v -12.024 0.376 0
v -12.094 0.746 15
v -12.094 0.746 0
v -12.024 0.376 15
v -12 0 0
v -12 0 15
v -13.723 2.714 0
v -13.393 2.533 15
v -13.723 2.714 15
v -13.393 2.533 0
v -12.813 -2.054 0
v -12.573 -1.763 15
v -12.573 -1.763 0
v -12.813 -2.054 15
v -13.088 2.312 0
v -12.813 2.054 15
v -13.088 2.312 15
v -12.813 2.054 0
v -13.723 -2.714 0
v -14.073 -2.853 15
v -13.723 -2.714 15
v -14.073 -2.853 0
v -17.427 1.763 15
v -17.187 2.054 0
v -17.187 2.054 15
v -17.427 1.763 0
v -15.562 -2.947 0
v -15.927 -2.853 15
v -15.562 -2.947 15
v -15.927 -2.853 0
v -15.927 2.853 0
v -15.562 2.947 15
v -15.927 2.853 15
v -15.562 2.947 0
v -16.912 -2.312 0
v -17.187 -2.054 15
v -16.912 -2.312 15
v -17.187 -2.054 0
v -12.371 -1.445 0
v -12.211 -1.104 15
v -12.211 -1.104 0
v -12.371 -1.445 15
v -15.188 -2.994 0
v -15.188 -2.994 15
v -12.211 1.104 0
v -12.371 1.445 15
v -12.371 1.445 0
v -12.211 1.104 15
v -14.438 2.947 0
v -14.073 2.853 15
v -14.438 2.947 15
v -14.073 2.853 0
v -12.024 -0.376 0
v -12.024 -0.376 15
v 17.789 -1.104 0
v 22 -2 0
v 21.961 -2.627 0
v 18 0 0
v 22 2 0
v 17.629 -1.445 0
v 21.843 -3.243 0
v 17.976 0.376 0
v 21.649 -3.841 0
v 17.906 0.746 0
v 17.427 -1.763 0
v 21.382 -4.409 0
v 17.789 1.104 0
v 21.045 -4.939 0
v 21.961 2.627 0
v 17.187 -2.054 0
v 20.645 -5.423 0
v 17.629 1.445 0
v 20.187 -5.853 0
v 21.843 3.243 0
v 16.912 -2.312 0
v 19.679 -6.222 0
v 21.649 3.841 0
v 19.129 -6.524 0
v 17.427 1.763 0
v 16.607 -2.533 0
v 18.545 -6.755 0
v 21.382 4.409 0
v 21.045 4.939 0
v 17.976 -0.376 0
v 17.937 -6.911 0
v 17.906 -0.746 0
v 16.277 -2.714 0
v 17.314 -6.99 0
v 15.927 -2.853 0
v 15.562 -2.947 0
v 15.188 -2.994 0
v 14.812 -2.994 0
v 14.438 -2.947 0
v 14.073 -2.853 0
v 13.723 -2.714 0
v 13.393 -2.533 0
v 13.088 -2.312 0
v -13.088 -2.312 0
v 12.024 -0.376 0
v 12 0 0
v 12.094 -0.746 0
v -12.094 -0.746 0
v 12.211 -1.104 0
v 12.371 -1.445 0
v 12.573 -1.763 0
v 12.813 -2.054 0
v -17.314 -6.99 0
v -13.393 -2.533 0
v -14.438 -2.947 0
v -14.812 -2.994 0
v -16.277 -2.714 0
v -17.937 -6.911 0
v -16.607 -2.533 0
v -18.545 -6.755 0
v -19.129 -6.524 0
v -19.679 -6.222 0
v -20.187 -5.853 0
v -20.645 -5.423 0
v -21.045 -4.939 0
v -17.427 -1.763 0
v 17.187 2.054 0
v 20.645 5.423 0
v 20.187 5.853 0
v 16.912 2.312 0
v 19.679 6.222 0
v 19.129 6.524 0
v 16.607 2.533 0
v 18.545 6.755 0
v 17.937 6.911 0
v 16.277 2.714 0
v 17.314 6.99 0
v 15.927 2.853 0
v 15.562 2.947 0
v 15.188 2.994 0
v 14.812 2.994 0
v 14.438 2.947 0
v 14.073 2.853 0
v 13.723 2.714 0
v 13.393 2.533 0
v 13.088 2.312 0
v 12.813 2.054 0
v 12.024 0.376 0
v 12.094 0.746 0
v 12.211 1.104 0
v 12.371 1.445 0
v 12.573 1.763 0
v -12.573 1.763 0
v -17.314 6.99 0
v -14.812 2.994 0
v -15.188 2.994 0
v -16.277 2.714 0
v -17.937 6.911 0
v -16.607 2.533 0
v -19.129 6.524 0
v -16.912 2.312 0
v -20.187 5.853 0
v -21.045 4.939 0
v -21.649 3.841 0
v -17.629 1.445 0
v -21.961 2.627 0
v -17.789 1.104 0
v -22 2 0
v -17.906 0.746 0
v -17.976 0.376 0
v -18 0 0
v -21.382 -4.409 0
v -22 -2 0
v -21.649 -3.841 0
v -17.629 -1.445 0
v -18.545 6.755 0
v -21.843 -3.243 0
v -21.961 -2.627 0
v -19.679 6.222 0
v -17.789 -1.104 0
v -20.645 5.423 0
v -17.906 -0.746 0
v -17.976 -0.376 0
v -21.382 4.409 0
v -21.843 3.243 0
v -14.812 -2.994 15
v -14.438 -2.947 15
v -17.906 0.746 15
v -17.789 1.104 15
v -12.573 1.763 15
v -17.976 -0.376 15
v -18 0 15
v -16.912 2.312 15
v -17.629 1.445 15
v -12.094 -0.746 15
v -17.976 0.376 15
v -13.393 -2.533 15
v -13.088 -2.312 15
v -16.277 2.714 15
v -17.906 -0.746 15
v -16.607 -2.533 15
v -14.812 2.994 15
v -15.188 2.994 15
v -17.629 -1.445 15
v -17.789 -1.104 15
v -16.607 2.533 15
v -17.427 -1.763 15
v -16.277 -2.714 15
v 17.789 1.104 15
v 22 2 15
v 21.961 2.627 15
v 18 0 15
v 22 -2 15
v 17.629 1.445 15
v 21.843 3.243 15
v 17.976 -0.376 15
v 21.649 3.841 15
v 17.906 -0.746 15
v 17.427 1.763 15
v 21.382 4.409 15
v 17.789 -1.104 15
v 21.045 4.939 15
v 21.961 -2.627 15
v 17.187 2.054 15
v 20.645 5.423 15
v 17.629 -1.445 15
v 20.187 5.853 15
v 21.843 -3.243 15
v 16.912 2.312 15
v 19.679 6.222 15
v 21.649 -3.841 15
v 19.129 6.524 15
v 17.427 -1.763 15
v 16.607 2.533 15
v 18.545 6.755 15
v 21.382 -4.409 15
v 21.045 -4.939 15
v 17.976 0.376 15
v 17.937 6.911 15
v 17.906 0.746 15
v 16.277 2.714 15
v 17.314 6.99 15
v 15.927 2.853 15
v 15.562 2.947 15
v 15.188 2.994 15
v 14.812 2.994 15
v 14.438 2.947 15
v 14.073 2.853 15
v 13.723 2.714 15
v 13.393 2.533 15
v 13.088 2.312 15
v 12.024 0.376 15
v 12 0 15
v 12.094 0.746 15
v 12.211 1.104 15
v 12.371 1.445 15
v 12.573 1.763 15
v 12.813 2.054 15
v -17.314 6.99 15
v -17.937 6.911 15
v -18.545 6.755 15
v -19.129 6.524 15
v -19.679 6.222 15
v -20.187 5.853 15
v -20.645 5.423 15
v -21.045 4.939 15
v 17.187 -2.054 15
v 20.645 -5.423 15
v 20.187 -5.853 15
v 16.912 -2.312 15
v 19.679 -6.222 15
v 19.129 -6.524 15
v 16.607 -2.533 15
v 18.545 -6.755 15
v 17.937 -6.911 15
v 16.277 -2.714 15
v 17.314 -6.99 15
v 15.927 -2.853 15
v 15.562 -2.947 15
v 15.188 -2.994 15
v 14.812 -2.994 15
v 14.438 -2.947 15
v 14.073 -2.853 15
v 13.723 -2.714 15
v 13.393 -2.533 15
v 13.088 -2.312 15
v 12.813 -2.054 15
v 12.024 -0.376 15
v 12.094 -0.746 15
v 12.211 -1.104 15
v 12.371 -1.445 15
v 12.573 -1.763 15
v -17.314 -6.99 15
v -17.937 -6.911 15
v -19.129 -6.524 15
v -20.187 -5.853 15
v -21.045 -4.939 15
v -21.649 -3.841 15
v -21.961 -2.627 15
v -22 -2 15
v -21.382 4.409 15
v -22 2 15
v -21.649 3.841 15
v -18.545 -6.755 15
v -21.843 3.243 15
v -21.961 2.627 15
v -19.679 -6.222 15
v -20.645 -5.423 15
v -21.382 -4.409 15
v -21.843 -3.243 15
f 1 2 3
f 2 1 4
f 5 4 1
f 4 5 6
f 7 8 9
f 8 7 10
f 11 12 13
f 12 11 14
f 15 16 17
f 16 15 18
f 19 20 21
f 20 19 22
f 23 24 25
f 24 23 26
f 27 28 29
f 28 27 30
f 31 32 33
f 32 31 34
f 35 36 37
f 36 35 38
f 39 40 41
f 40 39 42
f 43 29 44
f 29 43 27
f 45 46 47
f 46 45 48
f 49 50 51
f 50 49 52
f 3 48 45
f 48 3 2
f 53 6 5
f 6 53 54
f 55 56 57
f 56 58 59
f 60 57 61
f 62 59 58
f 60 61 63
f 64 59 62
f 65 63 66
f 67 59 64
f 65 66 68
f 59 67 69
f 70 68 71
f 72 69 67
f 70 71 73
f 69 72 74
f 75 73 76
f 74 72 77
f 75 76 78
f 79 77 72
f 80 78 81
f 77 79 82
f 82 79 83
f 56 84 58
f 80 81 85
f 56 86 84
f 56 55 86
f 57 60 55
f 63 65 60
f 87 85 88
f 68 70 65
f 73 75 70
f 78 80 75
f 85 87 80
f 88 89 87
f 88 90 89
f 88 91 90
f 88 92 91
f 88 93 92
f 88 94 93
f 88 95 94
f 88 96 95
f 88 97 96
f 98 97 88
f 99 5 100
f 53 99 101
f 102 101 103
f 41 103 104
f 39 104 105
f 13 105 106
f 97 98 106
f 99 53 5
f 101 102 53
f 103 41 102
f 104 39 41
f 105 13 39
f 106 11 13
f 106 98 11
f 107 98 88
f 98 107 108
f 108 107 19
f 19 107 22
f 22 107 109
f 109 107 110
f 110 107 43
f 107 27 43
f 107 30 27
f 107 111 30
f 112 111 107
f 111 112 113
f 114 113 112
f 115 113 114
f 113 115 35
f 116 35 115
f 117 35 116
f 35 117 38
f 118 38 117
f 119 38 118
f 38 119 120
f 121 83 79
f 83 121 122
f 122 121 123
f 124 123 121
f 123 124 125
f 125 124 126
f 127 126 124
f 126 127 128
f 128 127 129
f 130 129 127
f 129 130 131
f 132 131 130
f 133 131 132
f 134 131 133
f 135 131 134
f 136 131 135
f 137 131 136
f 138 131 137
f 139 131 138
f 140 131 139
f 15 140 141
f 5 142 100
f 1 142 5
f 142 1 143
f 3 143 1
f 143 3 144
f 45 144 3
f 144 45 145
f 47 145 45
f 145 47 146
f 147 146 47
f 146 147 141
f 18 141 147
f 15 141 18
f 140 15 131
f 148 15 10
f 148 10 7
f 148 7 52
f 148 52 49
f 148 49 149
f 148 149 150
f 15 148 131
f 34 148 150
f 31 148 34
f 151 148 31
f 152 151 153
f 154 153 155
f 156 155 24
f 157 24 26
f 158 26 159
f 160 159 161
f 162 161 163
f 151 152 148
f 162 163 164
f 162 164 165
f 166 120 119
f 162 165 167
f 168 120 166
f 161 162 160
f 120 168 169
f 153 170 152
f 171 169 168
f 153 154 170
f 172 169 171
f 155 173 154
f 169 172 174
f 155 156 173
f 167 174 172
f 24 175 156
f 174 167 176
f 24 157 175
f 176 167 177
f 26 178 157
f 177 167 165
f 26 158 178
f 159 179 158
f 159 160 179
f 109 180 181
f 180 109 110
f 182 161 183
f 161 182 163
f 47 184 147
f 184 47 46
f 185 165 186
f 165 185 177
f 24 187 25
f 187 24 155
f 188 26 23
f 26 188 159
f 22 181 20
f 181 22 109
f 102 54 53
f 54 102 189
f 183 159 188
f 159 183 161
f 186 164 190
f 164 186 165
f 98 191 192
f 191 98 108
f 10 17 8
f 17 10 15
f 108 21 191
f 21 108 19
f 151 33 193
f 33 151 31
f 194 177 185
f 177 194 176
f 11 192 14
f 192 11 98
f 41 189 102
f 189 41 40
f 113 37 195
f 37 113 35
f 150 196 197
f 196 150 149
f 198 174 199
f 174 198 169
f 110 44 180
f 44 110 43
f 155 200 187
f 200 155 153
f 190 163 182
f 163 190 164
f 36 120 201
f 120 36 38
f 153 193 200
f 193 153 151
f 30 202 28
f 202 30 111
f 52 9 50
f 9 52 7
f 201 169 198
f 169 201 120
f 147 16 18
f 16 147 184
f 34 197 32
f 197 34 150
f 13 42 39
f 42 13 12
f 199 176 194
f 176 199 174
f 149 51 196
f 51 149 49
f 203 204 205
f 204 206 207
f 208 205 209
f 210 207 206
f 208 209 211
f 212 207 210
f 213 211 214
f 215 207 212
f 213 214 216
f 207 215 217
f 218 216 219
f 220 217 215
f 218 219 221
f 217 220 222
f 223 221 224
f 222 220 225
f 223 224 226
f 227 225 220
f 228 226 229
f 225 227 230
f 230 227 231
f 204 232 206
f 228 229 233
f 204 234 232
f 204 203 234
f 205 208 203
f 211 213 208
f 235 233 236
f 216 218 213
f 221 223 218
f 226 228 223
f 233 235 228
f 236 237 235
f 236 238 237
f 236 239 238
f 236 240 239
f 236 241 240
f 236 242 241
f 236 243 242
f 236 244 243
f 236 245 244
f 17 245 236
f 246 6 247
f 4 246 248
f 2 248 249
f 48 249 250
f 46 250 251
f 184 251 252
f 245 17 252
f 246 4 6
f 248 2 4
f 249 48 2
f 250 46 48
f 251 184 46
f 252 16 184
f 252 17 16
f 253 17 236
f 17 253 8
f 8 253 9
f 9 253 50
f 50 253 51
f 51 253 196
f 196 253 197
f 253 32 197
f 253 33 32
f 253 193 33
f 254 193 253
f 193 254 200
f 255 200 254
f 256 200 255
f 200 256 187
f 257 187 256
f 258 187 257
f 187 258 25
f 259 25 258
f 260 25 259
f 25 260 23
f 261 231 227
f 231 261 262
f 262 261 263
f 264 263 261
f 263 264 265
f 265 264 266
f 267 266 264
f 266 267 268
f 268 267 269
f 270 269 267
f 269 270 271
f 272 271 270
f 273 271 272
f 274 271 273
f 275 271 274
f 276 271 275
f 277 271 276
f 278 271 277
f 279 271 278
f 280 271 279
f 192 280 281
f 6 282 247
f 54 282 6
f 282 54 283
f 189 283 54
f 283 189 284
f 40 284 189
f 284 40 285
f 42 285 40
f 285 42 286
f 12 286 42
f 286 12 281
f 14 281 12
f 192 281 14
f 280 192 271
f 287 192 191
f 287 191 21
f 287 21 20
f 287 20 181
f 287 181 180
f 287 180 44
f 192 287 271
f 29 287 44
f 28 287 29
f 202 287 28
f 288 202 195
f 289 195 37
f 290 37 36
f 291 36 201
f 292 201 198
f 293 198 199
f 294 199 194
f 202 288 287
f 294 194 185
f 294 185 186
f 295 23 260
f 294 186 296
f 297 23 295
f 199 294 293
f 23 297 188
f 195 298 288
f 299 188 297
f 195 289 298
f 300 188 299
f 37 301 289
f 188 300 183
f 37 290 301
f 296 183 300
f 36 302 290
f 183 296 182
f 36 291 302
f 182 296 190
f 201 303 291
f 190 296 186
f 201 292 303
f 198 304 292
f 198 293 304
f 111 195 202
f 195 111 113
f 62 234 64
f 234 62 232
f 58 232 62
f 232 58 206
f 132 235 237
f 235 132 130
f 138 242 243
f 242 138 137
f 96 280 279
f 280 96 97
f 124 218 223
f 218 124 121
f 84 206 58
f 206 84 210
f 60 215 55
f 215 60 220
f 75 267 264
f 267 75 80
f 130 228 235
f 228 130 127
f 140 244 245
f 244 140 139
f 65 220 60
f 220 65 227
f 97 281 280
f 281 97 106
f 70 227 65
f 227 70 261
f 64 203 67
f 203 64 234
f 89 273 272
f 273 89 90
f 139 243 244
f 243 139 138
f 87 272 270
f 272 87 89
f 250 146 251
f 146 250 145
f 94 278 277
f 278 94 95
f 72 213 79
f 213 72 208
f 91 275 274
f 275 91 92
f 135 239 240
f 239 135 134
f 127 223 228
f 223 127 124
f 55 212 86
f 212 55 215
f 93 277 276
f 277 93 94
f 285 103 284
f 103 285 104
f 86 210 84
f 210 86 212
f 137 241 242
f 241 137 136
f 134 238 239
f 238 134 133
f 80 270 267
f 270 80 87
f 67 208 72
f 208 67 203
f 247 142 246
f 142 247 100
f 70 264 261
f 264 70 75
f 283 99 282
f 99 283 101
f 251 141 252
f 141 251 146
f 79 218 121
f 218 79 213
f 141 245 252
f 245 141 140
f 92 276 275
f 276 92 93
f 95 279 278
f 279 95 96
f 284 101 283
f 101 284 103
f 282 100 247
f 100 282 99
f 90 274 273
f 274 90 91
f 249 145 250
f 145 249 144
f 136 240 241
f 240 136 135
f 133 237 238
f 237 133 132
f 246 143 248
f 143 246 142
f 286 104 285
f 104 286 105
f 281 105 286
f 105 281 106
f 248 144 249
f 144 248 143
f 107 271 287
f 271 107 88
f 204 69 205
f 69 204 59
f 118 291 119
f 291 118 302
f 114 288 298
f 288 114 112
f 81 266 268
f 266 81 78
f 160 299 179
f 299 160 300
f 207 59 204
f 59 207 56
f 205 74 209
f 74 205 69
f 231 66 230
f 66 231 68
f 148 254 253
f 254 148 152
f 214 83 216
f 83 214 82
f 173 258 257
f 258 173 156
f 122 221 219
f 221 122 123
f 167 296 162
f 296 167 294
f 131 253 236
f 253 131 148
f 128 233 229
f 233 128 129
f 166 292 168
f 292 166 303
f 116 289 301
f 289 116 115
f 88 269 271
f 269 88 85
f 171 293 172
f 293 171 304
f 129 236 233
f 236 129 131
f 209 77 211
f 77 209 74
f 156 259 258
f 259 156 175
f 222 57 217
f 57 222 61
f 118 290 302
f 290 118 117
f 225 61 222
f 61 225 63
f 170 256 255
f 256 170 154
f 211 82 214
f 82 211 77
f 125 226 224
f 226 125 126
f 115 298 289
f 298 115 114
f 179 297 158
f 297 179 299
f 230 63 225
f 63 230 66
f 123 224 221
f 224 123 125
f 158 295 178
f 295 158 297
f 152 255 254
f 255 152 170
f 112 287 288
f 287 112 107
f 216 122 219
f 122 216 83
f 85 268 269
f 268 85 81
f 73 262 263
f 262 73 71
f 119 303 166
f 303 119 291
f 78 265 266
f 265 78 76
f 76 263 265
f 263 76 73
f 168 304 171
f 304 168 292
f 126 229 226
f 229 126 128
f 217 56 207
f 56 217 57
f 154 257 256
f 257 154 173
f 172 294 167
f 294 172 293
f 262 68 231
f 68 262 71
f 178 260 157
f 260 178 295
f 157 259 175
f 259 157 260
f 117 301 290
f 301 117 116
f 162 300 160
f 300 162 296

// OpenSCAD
$fn = 50;


difference() {
	union() {
		hull() {
			translate(v = [-17.0000000000, 2.0000000000, 0]) {
				cylinder(h = 15, r = 5);
			}
			translate(v = [17.0000000000, 2.0000000000, 0]) {
				cylinder(h = 15, r = 5);
			}
			translate(v = [-17.0000000000, -2.0000000000, 0]) {
				cylinder(h = 15, r = 5);
			}
			translate(v = [17.0000000000, -2.0000000000, 0]) {
				cylinder(h = 15, r = 5);
			}
		}
	}
	union() {
		translate(v = [-15.0000000000, 0.0000000000, 0]) {
			cylinder(h = 15, r = 3.0000000000);
		}
		translate(v = [15.0000000000, 0.0000000000, 0]) {
			cylinder(h = 15, r = 3.0000000000);
		}
		translate(v = [-15.0000000000, 0.0000000000, 0]) {
			cylinder(h = 15, r = 1.5000000000);
		}
		translate(v = [15.0000000000, 0.0000000000, 0]) {
			cylinder(h = 15, r = 1.5000000000);
		}
		translate(v = [-15.0000000000, 0.0000000000, 0]) {
			cylinder(h = 15, r = 1.5000000000);
		}
		translate(v = [15.0000000000, 0.0000000000, 0]) {
			cylinder(h = 15, r = 1.5000000000);
		}
		translate(v = [-15.0000000000, 0.0000000000, 0]) {
			cylinder(h = 15, r = 1.5000000000);
		}
		translate(v = [15.0000000000, 0.0000000000, 0]) {
			cylinder(h = 15, r = 1.5000000000);
		}
	}
}
